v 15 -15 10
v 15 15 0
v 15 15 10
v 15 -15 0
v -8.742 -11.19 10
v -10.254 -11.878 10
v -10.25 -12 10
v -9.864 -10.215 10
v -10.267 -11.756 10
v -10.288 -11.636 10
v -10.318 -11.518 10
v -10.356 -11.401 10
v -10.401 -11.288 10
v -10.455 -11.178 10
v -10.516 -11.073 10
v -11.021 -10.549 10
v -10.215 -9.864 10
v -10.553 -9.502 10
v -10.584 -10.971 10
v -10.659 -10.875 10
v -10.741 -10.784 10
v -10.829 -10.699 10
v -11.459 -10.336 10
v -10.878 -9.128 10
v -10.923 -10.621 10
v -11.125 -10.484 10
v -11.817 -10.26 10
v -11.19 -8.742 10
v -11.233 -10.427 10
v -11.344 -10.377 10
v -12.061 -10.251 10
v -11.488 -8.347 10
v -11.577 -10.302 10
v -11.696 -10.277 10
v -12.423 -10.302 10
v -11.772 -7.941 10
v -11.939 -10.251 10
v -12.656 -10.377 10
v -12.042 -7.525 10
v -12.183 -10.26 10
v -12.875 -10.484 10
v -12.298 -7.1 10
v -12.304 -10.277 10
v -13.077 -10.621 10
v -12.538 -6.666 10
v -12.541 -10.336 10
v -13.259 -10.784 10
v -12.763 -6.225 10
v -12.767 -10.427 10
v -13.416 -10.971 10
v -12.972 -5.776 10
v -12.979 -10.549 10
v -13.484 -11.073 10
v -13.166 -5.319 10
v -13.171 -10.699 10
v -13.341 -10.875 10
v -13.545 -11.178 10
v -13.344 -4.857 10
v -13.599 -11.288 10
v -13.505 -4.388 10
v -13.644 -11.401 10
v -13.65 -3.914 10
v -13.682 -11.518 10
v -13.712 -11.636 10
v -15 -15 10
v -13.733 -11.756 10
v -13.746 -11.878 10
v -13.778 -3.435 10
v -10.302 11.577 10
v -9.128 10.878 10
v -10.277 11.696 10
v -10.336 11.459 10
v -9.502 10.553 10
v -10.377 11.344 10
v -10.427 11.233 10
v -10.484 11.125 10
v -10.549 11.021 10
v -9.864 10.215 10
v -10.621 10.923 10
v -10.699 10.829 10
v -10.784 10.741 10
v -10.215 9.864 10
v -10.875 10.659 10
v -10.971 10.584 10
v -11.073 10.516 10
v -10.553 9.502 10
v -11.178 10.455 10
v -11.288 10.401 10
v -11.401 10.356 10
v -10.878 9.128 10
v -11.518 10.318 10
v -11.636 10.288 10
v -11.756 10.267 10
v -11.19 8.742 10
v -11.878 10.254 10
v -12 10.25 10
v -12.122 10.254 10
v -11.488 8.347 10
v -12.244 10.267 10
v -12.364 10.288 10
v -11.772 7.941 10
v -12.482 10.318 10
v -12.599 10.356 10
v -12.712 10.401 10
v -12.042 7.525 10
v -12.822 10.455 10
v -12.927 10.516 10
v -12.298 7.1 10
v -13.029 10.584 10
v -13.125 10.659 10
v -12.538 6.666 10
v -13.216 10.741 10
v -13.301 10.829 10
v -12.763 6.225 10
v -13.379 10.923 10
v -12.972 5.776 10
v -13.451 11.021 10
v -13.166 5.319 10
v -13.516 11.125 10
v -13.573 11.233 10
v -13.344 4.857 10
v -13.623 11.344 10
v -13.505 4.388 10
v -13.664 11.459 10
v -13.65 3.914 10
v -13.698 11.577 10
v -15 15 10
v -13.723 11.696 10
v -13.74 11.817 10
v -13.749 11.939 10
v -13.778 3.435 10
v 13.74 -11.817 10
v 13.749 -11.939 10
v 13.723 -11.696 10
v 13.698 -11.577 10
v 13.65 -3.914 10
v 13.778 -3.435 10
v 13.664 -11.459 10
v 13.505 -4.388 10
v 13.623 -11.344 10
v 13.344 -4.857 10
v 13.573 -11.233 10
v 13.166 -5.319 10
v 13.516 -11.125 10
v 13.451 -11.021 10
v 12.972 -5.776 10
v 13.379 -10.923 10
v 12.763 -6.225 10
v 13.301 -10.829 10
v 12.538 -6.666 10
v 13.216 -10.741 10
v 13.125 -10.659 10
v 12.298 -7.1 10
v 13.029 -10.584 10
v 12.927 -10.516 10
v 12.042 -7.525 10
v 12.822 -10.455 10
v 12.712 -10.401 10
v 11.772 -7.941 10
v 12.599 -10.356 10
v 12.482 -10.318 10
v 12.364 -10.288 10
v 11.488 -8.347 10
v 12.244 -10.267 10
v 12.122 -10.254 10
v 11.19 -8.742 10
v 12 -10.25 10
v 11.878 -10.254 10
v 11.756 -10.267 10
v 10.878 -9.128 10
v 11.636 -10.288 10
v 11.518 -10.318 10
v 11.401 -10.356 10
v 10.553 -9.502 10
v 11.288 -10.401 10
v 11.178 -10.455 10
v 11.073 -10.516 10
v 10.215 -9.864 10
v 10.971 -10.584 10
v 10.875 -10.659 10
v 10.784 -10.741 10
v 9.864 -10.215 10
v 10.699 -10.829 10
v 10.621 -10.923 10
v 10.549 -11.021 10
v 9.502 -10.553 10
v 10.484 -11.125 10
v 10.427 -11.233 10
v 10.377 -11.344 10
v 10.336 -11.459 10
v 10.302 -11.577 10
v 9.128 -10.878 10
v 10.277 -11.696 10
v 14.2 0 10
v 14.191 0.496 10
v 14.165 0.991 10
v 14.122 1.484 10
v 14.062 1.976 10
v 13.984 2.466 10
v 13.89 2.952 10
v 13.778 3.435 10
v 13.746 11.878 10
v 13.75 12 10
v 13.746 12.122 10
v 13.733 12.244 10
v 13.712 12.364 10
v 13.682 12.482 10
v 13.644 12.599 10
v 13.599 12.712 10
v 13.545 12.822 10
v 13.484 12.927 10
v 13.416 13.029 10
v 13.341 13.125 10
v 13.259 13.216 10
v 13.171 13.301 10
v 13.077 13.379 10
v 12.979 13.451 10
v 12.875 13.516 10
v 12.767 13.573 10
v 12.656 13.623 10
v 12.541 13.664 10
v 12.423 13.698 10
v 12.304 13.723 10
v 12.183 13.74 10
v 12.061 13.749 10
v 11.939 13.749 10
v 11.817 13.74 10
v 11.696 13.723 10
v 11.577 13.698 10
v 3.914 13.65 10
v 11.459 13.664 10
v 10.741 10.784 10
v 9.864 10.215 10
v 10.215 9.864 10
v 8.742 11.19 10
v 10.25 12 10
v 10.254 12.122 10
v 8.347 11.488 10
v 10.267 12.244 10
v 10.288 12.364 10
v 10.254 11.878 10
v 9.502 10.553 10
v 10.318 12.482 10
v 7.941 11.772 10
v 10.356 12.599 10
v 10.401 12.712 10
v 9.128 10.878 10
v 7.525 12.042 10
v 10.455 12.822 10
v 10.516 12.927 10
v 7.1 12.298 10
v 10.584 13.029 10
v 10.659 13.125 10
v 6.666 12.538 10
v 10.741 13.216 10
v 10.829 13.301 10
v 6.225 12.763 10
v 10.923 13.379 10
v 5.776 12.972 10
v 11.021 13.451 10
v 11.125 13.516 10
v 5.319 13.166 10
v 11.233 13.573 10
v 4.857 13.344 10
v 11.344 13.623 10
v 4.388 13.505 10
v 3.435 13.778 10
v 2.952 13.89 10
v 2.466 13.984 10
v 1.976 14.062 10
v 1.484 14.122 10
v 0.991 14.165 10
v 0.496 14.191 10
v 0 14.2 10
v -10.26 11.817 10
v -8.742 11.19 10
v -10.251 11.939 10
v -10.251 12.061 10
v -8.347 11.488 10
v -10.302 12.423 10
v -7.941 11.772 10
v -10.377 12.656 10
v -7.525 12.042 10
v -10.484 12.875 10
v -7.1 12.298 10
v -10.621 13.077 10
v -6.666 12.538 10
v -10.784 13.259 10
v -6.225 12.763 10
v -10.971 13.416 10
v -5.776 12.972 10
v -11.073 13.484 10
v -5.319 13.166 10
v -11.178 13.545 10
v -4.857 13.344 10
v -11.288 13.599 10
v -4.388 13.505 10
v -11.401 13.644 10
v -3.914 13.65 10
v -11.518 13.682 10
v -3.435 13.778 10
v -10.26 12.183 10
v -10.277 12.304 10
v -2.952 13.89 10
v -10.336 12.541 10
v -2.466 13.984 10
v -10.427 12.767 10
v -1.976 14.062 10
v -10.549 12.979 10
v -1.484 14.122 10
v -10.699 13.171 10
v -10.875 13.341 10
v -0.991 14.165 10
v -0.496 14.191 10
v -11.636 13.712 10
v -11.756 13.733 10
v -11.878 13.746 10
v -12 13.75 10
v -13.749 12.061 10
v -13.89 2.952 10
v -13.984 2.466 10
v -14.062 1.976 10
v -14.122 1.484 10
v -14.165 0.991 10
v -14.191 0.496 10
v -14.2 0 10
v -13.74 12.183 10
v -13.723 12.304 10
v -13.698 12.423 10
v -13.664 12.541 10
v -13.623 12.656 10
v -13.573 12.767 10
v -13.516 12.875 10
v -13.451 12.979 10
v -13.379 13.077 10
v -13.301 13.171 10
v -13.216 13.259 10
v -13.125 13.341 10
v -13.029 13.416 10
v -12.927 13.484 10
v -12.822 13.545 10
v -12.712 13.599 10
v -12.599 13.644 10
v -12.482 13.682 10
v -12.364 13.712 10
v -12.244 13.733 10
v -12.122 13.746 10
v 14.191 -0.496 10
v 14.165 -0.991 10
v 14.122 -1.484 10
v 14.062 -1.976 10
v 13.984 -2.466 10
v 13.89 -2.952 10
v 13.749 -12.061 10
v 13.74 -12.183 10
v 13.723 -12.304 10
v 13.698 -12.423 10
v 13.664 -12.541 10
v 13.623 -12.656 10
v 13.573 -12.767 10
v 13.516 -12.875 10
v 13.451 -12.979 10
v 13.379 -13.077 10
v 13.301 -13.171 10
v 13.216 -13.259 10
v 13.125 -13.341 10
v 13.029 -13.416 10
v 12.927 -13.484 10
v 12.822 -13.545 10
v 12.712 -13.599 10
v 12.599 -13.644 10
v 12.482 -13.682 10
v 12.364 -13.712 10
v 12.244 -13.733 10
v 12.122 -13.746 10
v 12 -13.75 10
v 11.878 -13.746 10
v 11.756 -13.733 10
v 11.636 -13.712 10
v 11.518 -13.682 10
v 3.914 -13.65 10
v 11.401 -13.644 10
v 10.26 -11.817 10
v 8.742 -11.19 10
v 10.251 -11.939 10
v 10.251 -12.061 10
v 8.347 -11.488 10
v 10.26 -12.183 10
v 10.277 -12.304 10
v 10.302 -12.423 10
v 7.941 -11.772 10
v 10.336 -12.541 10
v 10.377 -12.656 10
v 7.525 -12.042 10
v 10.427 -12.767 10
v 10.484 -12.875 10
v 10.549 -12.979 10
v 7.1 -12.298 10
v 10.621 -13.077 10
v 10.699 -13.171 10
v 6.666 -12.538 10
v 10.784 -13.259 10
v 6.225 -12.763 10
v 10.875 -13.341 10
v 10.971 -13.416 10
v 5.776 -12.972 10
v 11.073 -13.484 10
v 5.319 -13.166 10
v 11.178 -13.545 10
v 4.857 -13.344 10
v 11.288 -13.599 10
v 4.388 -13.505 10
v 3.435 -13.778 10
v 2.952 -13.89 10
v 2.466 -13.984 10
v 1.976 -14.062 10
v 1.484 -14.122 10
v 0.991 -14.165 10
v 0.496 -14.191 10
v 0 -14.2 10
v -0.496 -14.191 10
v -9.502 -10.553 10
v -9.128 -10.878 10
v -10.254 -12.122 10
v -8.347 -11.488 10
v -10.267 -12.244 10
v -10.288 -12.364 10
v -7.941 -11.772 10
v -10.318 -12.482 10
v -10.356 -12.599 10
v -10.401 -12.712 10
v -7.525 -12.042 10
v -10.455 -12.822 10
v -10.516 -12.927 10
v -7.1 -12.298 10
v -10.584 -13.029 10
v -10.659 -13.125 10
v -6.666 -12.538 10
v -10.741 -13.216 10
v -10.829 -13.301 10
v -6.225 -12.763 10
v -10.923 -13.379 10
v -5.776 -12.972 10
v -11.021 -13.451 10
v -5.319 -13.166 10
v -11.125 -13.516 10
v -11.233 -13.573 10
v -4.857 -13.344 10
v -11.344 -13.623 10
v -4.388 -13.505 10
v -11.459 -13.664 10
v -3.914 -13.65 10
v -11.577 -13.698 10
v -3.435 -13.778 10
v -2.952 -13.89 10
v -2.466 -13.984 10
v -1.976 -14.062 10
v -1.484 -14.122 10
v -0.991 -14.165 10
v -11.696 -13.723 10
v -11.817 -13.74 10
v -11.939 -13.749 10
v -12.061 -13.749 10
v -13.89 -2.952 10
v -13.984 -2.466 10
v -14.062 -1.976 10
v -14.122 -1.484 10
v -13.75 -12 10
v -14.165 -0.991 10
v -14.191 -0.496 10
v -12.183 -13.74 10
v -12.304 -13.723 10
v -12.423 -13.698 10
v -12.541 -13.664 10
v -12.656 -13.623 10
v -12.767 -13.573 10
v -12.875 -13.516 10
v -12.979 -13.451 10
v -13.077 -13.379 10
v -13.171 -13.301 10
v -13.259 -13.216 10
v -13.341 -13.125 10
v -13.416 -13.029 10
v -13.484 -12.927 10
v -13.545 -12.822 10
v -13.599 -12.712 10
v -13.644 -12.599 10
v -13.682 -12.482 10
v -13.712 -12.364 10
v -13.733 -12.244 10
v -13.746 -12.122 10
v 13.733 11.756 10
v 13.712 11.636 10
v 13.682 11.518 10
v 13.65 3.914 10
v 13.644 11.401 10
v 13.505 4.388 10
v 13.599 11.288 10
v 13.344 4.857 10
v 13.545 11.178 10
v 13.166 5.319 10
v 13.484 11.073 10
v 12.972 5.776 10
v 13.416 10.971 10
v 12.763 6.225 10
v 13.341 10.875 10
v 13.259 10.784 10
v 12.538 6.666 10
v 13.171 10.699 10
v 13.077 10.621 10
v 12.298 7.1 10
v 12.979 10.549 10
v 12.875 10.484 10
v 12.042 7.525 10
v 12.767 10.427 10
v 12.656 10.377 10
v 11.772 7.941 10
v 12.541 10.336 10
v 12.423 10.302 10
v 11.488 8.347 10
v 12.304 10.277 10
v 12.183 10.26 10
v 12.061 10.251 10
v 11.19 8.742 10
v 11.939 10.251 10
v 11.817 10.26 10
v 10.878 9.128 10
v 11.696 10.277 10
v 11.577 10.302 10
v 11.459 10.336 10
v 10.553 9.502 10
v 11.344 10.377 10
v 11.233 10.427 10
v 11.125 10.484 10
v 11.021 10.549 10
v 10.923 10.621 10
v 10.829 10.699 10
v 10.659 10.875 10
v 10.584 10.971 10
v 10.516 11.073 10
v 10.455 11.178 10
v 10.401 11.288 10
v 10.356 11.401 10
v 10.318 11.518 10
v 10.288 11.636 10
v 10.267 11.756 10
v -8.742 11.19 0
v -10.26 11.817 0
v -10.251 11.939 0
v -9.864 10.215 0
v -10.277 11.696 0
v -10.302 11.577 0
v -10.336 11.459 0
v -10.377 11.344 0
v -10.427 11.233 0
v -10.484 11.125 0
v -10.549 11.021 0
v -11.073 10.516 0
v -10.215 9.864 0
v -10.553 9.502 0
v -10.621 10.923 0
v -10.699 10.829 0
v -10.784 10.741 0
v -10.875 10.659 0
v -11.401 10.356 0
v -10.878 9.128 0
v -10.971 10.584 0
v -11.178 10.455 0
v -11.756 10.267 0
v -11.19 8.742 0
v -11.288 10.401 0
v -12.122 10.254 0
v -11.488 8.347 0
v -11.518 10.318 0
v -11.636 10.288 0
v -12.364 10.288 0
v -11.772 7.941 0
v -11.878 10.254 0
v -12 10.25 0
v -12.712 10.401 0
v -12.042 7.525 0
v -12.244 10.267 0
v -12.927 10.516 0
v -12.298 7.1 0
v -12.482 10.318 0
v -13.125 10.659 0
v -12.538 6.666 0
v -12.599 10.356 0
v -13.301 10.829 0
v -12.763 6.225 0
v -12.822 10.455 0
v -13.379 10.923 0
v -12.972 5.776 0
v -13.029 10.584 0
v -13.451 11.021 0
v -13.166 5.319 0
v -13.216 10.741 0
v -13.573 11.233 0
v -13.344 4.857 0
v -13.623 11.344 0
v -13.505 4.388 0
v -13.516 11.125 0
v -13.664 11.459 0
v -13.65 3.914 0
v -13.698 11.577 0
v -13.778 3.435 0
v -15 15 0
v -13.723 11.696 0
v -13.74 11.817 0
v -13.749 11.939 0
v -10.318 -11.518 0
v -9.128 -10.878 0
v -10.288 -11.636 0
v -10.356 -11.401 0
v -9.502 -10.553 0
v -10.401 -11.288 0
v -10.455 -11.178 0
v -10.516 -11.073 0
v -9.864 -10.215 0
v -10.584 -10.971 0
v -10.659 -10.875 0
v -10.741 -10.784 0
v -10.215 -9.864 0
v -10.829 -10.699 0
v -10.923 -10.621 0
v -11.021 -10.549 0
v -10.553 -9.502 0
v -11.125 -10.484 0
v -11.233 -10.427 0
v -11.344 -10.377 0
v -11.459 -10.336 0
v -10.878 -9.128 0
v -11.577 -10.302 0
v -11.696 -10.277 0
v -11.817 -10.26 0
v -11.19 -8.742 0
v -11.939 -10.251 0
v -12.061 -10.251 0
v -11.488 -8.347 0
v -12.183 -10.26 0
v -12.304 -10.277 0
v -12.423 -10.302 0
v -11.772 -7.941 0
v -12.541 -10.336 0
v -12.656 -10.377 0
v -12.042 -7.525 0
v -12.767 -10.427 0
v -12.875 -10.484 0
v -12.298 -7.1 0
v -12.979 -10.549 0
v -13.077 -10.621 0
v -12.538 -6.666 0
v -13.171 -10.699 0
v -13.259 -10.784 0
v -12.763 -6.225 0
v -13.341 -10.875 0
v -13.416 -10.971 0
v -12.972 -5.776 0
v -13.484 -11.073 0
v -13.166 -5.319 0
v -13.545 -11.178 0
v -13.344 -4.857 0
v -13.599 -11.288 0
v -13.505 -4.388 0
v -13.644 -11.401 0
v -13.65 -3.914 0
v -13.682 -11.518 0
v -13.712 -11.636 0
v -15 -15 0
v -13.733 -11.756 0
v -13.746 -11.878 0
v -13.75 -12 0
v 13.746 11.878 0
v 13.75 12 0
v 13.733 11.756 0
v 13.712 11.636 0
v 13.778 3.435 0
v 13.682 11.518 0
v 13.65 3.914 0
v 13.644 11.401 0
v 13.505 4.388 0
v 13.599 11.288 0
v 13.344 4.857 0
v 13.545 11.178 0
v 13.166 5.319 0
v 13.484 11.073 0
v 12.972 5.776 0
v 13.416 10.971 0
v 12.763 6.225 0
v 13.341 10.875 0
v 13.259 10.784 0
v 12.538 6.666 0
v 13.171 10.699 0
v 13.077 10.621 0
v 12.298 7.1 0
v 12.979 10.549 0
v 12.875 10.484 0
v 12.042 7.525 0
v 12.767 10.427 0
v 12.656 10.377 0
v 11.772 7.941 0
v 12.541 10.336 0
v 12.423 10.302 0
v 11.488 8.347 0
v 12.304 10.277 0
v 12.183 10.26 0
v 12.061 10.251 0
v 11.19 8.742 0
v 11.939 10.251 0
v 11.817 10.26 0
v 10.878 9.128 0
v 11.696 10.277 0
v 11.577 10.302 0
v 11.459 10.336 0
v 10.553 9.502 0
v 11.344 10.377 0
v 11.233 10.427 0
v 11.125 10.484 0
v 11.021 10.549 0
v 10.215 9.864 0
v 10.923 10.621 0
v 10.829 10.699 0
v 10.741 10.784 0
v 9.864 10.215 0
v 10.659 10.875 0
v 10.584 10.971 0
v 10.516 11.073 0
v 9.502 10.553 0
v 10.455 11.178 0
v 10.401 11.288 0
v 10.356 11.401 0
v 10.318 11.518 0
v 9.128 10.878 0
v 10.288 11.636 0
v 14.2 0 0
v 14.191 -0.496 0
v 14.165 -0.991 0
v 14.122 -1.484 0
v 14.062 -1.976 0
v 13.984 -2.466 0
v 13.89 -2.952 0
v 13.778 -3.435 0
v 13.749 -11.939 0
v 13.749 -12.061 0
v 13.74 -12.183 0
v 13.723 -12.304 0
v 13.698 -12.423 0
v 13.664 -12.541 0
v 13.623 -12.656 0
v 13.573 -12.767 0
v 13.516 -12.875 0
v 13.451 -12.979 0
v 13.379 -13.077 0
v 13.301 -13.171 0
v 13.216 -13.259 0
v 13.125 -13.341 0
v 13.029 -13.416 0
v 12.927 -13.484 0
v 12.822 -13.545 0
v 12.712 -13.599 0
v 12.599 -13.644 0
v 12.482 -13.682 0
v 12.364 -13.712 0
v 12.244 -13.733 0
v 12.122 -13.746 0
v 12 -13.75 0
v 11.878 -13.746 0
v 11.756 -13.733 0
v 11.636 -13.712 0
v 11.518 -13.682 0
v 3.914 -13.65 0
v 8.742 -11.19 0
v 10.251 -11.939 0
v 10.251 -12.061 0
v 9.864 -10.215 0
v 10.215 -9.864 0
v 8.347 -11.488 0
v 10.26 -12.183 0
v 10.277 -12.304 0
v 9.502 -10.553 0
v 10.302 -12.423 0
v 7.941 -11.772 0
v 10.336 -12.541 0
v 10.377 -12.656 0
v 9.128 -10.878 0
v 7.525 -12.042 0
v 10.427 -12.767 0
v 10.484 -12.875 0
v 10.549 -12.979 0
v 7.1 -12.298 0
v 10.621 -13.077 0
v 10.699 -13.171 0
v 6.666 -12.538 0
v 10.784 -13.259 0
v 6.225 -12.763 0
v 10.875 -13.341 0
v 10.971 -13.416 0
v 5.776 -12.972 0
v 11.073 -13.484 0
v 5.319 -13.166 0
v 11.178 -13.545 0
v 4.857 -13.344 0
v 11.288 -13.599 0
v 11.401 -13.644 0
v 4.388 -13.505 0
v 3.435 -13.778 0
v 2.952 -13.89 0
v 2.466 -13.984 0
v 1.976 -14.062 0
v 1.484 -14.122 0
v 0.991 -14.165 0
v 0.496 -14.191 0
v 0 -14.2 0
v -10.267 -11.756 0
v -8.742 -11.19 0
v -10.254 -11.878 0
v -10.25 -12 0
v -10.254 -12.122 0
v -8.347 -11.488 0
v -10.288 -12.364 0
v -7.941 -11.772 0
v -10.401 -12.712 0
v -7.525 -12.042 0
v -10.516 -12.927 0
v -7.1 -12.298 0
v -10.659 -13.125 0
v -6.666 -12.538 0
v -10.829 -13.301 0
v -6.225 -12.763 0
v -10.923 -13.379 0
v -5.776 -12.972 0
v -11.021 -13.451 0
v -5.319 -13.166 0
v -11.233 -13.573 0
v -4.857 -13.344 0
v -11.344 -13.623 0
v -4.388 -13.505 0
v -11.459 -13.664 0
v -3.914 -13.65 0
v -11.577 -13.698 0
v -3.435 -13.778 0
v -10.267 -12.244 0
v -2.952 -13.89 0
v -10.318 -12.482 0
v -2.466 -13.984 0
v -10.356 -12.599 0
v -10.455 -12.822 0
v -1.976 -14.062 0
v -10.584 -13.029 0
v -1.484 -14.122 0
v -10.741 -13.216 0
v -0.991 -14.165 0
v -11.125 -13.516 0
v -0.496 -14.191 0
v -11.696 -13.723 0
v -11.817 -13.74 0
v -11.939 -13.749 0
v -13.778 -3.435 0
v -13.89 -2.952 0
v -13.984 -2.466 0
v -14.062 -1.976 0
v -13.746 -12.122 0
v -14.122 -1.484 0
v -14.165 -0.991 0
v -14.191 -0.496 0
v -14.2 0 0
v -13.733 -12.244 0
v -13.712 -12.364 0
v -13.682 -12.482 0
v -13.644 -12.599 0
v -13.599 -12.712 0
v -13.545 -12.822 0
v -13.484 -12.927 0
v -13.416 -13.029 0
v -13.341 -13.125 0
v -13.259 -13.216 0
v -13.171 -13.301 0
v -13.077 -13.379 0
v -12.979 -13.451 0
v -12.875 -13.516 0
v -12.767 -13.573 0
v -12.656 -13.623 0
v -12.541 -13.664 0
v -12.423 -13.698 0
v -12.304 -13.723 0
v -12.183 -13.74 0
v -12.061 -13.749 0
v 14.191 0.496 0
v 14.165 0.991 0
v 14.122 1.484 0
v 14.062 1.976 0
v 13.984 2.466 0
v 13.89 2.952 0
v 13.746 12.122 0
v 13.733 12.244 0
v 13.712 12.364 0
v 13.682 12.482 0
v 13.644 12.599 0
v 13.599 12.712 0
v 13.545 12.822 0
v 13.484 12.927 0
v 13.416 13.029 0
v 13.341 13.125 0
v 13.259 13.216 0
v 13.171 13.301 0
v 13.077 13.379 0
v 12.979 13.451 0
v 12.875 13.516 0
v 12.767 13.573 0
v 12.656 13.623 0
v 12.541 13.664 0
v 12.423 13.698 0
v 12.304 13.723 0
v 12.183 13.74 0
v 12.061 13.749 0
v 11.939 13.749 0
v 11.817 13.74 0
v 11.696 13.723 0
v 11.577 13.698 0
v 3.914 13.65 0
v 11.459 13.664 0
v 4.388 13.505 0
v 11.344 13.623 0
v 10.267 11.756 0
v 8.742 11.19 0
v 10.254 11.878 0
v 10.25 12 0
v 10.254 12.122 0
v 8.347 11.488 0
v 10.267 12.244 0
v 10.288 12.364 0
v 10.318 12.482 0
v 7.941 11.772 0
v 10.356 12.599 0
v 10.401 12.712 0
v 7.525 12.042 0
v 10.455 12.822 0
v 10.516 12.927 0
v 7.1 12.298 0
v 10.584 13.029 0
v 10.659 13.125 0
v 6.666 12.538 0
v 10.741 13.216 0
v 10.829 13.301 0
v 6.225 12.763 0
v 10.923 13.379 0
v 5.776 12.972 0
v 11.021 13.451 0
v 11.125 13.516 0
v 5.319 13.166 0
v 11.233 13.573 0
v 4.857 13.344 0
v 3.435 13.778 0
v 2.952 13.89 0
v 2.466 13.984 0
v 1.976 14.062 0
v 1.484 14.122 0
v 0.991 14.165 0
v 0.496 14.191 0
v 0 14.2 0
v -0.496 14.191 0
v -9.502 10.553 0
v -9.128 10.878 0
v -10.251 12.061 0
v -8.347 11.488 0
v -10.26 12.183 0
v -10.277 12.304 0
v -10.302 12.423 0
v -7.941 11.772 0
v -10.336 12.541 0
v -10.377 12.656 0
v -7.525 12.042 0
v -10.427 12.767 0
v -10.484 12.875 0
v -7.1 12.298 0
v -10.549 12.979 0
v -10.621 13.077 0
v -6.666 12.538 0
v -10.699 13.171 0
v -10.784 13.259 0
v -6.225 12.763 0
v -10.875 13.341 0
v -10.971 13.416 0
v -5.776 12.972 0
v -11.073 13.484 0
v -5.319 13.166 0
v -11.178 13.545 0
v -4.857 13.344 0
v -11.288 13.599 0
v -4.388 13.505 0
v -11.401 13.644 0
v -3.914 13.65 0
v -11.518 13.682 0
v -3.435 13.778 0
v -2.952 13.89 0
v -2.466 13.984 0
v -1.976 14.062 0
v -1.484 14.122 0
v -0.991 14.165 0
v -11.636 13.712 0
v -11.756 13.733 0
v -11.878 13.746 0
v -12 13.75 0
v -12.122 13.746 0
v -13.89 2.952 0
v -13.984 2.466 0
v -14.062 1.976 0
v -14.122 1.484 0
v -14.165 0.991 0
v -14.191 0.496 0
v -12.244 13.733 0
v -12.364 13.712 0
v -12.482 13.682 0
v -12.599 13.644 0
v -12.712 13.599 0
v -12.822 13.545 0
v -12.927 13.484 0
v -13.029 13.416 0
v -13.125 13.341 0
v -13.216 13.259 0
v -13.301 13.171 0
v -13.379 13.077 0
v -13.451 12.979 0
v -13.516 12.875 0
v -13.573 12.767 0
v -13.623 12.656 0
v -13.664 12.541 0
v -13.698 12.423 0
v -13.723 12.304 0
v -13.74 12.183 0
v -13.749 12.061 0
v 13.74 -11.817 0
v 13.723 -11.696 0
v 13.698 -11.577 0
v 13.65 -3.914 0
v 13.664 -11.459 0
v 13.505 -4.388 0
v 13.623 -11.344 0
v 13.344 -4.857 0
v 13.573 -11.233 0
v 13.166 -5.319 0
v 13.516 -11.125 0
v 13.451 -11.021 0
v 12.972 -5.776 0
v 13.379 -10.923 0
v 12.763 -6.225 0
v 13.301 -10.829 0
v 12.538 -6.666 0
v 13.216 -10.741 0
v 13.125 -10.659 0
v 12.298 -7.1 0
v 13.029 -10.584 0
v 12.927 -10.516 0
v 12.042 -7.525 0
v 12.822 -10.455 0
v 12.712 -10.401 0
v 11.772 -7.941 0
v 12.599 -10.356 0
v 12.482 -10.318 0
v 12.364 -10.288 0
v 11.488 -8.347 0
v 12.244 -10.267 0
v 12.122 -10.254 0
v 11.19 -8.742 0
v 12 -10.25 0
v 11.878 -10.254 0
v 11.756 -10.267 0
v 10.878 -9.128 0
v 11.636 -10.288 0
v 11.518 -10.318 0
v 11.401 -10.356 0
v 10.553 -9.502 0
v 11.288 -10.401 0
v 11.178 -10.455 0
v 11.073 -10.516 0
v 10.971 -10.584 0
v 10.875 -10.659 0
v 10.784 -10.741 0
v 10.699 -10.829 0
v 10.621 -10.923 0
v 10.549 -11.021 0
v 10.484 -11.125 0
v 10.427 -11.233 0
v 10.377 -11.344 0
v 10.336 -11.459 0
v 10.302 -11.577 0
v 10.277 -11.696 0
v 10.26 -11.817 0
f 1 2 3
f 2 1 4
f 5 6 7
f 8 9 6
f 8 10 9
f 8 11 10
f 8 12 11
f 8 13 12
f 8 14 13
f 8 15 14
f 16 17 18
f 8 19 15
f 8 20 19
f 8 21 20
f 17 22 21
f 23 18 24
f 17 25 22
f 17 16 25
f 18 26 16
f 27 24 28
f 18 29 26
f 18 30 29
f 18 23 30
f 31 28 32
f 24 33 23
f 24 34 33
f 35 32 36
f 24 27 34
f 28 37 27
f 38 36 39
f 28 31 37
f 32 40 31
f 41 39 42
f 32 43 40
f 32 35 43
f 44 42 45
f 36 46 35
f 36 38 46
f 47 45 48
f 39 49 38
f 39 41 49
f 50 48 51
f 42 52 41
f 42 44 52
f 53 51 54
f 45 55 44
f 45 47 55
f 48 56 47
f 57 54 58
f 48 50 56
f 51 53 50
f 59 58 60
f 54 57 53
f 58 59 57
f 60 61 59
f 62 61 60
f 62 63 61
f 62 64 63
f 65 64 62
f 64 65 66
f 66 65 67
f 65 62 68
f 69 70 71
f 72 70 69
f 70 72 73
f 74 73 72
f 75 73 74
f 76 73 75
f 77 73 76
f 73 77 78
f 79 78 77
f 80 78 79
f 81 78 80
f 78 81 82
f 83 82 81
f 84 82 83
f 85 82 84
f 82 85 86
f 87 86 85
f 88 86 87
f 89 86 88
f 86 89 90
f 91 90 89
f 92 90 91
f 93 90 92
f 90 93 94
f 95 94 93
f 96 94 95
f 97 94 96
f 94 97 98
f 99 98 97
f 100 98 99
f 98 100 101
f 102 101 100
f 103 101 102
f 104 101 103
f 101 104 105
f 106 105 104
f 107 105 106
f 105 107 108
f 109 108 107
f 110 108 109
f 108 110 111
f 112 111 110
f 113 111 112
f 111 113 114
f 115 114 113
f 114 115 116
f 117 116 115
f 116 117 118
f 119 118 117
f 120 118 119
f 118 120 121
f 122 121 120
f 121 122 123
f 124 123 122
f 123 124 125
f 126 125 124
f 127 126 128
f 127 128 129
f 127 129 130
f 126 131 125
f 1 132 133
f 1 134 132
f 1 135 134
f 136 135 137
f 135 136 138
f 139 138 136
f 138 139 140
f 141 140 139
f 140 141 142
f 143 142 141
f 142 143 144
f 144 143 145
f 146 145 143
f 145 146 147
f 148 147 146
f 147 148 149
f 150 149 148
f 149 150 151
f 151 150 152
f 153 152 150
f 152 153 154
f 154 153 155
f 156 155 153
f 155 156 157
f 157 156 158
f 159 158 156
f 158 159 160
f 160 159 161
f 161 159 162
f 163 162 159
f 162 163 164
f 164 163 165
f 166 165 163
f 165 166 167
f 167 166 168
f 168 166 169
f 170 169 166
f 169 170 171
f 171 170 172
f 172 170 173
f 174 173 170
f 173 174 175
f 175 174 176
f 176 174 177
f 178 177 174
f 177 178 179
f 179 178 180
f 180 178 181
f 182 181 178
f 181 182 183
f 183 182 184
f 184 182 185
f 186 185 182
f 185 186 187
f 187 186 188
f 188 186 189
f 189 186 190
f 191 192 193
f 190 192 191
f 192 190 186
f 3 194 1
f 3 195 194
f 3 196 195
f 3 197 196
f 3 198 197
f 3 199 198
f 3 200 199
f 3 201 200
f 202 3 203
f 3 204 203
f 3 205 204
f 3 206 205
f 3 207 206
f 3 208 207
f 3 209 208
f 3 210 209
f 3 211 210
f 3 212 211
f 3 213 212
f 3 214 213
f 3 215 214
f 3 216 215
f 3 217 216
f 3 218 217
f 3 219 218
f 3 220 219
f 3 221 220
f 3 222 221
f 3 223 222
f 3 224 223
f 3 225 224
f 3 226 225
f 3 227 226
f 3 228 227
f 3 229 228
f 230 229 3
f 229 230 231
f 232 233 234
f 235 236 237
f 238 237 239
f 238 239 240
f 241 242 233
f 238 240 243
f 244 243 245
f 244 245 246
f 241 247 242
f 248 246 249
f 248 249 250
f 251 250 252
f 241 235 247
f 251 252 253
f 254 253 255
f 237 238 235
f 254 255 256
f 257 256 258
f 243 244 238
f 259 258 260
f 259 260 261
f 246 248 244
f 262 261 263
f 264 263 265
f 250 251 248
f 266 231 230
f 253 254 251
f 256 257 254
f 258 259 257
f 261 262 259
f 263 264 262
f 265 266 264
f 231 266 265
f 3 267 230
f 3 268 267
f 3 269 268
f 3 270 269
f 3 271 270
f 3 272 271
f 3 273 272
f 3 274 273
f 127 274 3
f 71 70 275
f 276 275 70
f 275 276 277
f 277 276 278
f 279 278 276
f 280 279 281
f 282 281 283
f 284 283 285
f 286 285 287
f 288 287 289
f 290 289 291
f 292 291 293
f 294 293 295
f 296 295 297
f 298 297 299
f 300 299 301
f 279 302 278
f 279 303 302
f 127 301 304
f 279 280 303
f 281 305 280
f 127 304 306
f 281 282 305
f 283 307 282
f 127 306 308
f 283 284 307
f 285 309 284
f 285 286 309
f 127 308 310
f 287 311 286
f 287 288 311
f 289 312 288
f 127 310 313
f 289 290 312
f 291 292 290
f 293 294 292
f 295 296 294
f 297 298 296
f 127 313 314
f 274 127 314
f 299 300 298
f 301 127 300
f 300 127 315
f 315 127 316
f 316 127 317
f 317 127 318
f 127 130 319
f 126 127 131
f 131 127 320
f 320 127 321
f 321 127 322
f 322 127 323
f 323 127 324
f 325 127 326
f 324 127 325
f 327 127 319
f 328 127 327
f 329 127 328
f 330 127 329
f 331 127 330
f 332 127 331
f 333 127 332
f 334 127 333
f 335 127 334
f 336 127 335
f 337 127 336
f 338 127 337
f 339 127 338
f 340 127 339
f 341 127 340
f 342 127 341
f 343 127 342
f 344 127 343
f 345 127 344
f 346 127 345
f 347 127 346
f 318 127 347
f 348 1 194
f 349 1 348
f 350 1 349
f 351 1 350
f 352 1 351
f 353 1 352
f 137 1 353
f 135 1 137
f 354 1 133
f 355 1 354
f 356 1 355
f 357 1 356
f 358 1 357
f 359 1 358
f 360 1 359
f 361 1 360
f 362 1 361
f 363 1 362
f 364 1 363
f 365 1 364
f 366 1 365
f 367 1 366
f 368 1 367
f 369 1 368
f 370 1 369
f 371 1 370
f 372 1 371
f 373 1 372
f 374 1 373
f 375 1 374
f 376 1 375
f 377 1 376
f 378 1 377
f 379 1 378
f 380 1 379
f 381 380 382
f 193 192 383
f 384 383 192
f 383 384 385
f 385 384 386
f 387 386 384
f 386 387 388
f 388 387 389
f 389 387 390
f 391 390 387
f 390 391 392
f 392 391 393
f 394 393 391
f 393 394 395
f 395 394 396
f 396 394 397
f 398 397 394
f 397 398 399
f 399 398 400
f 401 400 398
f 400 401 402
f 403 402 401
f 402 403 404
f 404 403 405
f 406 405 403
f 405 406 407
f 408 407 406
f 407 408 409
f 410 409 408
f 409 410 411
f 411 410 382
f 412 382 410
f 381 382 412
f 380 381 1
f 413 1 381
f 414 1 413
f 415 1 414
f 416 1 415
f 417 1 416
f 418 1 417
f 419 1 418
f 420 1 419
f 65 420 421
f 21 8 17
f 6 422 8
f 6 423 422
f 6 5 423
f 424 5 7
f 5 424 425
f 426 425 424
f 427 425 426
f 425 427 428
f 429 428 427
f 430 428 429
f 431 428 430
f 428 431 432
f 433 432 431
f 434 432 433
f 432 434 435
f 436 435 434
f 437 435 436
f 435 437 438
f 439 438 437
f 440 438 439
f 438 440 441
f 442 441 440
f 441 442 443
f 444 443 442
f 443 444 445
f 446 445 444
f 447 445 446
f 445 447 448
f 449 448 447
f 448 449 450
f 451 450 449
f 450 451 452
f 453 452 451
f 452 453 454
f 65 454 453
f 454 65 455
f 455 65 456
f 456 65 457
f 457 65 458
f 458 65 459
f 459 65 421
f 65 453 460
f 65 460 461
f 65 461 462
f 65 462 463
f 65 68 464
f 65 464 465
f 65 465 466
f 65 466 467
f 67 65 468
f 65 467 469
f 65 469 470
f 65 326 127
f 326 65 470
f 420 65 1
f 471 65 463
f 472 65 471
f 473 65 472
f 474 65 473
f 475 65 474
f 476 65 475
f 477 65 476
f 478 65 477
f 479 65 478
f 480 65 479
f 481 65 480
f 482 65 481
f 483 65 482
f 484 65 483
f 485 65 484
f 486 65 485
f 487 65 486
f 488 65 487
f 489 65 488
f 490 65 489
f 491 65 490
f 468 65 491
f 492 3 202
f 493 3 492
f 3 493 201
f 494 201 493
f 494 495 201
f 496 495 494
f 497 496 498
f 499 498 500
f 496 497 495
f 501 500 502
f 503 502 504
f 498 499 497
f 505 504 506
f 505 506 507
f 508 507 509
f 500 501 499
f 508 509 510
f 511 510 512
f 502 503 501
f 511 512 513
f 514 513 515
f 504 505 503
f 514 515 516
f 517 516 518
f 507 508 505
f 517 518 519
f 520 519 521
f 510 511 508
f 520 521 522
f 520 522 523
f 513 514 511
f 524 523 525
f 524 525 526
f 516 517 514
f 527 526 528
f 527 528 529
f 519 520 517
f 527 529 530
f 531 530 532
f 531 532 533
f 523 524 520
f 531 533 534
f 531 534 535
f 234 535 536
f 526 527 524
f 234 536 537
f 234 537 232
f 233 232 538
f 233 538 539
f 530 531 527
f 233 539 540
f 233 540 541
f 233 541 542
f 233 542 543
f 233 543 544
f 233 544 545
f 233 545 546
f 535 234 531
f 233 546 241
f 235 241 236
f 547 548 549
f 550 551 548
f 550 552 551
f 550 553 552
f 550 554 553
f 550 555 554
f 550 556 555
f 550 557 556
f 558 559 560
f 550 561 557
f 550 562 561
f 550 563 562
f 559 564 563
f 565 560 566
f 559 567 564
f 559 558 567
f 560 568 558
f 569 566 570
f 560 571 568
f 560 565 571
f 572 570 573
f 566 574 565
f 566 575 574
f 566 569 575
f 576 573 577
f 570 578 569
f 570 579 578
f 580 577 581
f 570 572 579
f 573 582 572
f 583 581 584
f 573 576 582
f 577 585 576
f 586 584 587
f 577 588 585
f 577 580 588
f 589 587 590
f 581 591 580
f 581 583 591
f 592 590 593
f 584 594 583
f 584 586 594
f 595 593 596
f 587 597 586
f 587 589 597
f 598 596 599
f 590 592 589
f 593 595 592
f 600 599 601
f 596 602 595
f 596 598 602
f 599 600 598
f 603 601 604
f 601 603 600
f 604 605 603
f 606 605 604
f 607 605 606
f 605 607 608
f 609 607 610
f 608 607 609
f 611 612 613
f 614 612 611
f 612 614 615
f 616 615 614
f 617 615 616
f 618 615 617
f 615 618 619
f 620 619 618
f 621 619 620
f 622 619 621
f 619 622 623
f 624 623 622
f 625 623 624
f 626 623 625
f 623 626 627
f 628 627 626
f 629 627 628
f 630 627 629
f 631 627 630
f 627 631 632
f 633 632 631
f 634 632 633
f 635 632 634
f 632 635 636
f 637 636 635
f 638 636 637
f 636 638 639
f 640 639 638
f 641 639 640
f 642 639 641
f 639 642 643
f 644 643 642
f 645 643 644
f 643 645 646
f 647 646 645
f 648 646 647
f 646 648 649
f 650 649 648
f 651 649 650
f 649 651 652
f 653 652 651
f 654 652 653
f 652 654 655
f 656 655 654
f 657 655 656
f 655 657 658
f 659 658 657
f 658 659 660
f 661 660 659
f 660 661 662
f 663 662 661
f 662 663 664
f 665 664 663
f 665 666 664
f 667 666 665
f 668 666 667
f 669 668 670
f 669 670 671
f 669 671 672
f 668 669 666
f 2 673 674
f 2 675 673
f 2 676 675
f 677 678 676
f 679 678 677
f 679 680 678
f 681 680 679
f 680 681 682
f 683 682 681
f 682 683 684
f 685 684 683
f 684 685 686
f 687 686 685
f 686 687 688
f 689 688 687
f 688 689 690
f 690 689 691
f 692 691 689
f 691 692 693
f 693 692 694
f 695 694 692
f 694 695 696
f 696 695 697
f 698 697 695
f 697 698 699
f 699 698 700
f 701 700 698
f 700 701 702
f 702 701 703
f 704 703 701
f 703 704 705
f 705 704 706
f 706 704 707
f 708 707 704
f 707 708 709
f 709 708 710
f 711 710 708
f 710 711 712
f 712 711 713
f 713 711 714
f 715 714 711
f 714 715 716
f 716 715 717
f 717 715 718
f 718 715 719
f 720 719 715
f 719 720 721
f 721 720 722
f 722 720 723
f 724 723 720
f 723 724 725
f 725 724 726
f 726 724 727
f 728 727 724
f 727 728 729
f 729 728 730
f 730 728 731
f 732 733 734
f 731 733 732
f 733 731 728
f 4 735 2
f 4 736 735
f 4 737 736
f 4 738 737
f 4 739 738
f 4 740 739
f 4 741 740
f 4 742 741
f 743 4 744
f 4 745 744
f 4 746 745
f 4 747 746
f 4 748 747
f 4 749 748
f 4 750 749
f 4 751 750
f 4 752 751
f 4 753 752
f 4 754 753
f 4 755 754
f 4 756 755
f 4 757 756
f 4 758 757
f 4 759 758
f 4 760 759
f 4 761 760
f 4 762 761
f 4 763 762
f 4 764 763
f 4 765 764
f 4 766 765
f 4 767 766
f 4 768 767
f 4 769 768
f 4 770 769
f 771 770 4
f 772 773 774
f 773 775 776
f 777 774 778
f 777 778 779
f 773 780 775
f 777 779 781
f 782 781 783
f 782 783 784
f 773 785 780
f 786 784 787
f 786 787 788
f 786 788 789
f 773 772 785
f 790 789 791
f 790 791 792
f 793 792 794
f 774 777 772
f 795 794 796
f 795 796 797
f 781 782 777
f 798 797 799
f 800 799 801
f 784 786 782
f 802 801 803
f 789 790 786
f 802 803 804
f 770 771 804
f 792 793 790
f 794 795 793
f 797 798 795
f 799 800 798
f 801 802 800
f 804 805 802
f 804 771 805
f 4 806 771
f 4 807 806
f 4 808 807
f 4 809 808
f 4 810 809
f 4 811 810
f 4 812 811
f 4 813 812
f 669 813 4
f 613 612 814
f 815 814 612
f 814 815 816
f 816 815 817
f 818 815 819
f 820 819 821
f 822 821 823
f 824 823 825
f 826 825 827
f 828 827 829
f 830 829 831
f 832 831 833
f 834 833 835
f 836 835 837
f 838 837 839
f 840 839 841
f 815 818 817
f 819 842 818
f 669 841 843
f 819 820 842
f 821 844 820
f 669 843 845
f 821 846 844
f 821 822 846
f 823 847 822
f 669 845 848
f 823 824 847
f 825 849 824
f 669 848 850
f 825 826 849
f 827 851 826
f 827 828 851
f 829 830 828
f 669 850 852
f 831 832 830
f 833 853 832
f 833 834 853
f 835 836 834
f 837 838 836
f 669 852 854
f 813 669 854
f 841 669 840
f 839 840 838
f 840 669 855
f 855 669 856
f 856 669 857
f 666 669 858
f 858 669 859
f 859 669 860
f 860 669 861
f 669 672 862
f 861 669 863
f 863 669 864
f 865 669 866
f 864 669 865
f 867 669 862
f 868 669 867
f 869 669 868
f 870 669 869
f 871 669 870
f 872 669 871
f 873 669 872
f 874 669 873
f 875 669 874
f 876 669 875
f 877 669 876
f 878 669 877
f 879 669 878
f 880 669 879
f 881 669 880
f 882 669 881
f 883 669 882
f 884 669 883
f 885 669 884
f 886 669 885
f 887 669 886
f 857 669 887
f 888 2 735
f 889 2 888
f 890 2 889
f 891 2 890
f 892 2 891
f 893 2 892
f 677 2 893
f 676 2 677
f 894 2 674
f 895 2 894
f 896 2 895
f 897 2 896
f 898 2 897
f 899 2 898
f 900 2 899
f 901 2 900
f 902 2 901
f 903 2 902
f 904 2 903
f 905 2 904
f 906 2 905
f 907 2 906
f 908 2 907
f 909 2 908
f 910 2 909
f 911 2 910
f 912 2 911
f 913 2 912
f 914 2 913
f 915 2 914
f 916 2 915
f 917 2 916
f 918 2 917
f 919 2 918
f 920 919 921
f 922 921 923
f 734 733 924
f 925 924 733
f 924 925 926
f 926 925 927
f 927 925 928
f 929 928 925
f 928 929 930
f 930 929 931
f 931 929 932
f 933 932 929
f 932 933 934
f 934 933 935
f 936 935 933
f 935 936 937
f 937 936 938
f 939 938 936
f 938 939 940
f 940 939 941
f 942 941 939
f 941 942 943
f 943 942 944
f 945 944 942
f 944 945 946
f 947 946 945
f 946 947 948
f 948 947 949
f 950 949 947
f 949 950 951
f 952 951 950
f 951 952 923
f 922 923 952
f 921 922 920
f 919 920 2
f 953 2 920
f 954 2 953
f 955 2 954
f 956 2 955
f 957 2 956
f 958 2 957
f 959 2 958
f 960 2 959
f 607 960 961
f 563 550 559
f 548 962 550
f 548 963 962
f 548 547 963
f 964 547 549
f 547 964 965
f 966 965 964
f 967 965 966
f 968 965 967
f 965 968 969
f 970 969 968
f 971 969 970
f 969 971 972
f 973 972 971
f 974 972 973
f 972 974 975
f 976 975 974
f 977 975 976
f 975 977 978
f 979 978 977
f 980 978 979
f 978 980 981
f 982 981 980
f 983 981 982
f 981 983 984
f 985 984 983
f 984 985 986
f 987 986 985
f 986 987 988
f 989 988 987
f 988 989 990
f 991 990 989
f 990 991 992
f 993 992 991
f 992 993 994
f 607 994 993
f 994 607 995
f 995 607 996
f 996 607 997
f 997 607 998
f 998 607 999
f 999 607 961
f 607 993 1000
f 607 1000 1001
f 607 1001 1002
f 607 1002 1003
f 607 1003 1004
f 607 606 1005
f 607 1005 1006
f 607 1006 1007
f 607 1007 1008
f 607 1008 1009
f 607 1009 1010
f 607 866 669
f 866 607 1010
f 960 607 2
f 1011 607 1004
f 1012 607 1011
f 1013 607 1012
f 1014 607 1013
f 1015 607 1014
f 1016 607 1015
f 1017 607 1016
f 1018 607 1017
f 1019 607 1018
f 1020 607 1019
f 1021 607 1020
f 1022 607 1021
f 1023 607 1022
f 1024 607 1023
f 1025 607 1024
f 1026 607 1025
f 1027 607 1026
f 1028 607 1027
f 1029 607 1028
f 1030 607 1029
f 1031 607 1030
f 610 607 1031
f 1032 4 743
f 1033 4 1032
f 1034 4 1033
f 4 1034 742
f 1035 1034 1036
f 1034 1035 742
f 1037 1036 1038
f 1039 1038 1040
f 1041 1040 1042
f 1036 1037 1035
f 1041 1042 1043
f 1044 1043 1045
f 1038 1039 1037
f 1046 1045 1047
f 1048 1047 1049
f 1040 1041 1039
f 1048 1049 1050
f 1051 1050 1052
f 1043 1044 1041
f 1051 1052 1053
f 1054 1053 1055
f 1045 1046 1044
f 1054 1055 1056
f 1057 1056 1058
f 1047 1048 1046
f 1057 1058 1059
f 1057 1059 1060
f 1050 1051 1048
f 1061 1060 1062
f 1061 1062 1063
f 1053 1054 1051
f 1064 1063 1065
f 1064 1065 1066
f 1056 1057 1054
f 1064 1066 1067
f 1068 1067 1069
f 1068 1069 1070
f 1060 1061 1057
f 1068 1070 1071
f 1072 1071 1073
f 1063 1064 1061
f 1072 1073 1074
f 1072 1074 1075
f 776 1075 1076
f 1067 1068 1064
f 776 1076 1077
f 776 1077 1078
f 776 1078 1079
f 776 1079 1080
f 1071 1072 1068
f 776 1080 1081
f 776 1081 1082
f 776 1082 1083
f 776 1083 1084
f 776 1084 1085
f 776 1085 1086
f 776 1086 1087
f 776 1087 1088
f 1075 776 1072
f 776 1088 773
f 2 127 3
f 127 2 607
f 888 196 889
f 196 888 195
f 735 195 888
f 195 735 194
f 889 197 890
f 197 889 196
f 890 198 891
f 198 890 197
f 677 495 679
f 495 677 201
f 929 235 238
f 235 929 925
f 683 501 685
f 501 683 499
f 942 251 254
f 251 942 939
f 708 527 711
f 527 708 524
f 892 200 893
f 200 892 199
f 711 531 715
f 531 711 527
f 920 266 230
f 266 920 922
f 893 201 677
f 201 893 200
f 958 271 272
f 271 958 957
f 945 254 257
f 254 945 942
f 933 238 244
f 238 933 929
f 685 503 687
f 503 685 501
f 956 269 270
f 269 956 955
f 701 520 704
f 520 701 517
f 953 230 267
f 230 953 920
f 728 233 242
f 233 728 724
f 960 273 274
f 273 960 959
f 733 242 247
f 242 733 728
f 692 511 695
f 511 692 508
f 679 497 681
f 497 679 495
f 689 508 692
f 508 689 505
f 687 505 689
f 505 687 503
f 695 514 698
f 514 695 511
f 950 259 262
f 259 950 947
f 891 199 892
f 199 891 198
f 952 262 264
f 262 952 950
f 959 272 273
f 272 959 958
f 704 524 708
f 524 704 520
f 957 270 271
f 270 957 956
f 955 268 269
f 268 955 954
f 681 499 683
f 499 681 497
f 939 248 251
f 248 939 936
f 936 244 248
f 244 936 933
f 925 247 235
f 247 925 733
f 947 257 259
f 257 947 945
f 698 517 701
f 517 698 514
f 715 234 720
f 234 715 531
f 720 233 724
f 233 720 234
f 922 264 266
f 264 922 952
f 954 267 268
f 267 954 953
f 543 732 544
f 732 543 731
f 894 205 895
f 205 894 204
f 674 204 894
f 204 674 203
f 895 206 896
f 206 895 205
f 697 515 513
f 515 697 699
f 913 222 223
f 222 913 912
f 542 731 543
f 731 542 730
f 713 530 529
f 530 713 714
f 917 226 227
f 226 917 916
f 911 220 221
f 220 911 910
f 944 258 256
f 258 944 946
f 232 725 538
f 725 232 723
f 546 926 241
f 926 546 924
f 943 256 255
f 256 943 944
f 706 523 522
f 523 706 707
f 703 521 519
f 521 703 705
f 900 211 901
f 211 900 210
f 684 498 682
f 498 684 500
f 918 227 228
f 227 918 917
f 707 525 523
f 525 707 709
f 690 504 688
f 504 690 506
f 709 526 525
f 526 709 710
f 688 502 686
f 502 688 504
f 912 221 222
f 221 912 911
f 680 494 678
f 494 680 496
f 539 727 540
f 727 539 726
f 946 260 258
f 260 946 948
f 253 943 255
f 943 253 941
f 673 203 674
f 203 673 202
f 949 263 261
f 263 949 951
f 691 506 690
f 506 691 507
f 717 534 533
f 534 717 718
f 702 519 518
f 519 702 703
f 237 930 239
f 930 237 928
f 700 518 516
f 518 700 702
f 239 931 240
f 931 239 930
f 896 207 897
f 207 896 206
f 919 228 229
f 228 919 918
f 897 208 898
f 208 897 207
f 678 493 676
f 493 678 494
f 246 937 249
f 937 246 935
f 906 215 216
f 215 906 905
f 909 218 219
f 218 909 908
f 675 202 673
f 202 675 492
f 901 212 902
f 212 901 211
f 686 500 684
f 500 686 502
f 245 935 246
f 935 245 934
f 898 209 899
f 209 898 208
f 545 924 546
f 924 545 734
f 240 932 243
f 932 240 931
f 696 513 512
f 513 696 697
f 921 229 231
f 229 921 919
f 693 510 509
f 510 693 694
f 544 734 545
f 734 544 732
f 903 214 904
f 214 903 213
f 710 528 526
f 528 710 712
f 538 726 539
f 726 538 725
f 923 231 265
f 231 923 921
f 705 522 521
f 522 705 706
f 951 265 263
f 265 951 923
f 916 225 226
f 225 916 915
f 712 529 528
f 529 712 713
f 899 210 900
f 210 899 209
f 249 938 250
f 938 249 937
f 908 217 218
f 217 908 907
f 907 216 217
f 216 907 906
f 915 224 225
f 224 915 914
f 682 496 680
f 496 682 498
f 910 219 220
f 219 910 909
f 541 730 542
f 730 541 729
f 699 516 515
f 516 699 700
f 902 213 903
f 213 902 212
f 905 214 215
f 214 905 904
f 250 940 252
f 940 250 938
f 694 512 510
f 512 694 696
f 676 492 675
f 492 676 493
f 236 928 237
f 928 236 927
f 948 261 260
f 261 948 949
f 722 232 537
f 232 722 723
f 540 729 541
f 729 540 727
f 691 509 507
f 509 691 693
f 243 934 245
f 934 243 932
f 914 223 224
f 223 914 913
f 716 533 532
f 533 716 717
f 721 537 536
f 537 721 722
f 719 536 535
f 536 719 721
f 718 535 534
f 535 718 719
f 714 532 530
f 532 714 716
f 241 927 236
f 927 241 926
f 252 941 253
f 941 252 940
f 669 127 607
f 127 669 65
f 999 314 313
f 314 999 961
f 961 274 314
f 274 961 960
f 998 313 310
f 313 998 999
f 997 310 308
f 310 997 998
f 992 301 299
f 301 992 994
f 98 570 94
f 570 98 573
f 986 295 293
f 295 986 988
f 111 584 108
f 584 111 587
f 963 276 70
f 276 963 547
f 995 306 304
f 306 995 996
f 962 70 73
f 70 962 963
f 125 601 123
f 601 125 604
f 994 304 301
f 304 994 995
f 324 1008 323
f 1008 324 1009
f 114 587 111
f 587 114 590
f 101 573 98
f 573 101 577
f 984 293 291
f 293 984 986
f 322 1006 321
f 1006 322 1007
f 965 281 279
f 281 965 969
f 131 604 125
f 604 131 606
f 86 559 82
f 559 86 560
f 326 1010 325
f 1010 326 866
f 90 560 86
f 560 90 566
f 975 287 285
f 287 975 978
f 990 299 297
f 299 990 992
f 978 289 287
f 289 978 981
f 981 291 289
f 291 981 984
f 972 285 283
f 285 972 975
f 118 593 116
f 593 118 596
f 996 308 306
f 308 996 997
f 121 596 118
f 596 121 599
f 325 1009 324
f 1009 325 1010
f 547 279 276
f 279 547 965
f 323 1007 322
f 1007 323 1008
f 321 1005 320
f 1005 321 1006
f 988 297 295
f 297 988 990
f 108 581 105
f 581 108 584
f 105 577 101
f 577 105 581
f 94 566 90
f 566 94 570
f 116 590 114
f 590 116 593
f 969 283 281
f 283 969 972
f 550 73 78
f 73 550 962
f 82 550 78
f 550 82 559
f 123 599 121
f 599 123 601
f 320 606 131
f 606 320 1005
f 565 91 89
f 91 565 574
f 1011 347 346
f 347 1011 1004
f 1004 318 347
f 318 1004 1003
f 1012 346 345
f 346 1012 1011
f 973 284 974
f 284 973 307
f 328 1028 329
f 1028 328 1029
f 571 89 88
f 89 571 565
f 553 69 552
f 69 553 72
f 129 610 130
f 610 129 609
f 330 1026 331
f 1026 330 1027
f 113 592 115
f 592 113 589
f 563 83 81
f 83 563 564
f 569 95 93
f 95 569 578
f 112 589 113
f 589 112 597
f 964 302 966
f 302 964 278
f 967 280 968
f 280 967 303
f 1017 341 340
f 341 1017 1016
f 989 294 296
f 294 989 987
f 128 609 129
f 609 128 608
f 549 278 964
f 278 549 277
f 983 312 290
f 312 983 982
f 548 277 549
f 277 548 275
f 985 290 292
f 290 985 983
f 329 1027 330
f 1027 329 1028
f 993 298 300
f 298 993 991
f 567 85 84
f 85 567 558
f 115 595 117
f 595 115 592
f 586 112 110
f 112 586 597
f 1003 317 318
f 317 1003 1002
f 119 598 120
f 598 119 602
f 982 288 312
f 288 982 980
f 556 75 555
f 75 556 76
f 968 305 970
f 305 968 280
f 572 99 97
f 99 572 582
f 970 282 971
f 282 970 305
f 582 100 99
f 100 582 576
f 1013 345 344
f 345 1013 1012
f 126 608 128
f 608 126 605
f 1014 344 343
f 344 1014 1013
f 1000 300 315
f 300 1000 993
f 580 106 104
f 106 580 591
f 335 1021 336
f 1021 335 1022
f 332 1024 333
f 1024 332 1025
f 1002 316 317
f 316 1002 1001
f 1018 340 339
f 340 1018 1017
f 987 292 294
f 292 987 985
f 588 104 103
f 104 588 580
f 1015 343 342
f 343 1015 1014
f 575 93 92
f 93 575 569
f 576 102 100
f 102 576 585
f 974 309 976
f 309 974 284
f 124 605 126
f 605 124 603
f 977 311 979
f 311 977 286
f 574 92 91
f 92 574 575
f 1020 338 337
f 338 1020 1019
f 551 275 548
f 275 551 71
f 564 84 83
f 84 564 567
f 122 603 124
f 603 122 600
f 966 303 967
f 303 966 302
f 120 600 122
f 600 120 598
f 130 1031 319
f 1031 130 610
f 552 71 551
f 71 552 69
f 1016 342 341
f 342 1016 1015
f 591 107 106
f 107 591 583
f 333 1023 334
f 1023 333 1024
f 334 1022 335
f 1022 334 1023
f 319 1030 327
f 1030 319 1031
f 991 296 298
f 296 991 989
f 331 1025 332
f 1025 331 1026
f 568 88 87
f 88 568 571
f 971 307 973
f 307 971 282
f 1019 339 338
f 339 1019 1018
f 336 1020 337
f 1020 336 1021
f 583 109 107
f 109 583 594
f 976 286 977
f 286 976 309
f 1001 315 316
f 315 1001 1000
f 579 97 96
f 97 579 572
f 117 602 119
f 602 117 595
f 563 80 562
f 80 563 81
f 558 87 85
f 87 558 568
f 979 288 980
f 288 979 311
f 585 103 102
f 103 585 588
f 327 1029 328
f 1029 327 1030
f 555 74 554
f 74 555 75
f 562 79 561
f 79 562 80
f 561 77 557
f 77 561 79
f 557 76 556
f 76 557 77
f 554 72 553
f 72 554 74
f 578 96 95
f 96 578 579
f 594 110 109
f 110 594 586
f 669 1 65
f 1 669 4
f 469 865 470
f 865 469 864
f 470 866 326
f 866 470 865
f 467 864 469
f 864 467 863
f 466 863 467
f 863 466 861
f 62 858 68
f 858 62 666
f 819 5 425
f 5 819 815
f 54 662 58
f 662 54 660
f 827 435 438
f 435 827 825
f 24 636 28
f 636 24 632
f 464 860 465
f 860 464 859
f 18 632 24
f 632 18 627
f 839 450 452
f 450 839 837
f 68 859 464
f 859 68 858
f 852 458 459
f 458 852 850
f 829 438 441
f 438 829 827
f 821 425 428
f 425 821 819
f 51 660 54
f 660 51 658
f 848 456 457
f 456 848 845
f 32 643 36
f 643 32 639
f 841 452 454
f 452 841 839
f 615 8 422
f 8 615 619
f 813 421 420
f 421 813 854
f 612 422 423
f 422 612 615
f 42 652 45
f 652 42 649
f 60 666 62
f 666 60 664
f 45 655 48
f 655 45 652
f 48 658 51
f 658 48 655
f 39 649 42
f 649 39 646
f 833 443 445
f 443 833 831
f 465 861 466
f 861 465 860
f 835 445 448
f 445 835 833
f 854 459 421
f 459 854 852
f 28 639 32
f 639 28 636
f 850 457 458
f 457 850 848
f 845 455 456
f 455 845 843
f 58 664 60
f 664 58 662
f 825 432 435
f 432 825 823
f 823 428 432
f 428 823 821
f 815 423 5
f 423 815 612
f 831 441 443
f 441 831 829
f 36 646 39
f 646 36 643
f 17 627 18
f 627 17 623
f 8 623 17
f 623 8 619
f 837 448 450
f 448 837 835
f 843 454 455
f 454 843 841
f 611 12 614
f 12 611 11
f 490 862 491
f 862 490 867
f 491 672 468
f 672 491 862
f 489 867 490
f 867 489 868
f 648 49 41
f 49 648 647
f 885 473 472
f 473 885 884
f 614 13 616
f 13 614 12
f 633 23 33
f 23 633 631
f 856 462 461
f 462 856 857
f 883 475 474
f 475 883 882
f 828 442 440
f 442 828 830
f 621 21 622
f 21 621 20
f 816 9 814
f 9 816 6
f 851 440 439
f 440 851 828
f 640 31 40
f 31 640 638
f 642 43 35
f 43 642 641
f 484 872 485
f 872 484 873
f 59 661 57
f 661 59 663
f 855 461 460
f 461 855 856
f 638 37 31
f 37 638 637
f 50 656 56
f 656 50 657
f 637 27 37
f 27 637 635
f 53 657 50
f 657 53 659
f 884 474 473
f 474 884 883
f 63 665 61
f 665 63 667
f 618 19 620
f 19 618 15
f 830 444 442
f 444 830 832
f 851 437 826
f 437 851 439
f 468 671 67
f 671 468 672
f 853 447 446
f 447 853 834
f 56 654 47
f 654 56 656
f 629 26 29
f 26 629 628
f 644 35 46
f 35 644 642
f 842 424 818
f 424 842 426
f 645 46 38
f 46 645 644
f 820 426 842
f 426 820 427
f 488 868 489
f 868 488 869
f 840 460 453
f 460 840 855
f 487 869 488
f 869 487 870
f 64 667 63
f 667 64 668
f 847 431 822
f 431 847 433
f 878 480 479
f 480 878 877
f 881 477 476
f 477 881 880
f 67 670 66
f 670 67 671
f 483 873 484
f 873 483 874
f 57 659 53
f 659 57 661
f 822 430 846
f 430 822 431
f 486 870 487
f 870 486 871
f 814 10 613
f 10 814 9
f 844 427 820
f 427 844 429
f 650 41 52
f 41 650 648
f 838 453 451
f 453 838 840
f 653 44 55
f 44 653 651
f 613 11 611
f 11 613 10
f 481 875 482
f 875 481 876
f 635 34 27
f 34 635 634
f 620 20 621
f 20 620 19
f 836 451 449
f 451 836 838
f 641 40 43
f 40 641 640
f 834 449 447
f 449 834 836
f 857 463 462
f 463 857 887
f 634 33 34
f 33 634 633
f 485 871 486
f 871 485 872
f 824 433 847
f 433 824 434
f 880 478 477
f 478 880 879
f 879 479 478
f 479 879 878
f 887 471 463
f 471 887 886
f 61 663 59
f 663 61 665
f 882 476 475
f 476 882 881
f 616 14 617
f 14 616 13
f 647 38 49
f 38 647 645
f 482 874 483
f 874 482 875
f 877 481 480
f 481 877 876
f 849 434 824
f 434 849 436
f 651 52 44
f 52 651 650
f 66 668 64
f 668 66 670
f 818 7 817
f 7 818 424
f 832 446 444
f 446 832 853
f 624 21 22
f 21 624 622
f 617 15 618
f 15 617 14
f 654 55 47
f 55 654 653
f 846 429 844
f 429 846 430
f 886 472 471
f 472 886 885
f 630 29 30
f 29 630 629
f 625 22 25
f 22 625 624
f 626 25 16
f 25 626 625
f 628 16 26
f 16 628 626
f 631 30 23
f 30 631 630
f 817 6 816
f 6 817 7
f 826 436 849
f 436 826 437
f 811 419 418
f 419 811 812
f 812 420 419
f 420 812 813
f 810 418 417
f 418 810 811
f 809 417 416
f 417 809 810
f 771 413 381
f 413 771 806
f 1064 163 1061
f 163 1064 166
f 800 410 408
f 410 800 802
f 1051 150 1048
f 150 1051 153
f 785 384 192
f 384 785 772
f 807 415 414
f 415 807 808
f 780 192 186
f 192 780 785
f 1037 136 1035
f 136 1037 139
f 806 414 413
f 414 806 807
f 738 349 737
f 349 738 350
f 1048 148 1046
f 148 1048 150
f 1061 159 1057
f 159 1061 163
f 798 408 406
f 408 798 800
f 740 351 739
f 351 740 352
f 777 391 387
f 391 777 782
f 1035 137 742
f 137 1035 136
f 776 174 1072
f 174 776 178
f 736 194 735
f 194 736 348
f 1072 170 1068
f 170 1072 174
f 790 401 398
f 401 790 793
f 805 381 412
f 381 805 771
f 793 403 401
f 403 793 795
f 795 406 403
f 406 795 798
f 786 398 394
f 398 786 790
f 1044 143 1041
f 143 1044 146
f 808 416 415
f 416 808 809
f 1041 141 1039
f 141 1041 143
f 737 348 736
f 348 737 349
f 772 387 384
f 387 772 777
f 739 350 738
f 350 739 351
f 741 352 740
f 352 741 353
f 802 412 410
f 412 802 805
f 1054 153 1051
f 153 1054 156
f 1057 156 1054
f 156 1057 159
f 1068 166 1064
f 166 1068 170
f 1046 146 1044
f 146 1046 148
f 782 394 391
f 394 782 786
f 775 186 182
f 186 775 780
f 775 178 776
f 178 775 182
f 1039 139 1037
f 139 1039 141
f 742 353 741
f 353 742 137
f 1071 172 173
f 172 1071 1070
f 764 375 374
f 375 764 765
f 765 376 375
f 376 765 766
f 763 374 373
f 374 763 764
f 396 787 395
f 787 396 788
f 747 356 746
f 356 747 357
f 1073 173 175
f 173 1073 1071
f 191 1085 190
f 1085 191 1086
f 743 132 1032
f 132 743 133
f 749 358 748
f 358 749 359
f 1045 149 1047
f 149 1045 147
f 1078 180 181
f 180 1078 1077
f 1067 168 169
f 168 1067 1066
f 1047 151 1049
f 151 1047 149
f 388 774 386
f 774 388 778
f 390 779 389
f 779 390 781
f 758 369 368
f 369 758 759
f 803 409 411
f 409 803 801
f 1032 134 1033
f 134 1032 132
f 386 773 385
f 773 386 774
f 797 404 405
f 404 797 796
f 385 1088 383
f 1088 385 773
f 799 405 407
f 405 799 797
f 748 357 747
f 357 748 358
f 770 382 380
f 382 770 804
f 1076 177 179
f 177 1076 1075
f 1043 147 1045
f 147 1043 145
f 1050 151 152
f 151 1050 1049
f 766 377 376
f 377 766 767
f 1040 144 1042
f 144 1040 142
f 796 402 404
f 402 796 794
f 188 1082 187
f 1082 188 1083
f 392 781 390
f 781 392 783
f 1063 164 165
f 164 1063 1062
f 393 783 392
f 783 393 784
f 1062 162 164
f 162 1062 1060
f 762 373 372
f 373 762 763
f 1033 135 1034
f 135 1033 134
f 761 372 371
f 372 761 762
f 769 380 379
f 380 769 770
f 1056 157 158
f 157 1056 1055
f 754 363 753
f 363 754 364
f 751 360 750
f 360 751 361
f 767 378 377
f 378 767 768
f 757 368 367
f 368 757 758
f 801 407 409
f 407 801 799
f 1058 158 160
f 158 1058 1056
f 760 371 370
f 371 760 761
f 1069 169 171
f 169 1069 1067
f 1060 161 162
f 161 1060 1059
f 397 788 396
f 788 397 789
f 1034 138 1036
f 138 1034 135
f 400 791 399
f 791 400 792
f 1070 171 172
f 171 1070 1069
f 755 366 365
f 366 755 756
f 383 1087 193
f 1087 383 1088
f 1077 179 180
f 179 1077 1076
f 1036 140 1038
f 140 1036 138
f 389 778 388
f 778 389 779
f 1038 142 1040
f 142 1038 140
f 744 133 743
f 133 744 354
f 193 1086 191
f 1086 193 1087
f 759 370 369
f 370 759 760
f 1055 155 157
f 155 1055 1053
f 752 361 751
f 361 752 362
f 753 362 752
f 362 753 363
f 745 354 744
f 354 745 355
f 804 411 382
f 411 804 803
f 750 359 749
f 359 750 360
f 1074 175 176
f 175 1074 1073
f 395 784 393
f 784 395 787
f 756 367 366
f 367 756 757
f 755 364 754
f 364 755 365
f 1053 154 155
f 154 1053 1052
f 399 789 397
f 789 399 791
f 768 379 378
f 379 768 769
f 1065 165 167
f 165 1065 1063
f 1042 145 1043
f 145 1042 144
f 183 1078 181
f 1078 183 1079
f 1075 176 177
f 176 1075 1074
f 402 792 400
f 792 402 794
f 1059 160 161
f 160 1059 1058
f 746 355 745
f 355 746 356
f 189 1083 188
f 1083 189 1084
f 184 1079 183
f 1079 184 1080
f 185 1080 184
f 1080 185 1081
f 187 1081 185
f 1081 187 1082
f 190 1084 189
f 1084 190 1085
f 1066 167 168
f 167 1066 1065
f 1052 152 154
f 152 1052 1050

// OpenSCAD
module fan_30mm_quarter(){
    difference(){
        translate([7.5, 7.5, 5]){
            cube([15, 15, 10], center=true);
        }
        cylinder(r = 14.2, h = 100, $fn=180, center=true);
        translate([12,12]){
            difference(){
                translate([1.5, 1.5, 0]){
                    cube([3.05, 3.05, 50], center = true);
                }
                cylinder(r = 3, h = 50, $fn=180, center=true);
            }
        }
        translate([12, 12]){
            cylinder(r = 1.75, h = 50, center = true, $fn = 90);
        }
    }
}

module fan_30mm_quarter_square(){
    difference(){
        translate([7.5, 7.5, 5]){
            cube([15, 15, 10], center=true);
        }
        cylinder(r = 14.2, h = 100, $fn=180, center=true);
        translate([12, 12]){
            cylinder(r = 1.75, h = 50, center = true, $fn = 90);
        }
    }
  }

module fan_no_center(){
                for(n = [0:3]){
                rotate([0, 0, 90 * n]){
                   fan_30mm_quarter();  
                }
            }
    }
    //fan_no_center();
    
  module fan_no_center_square(){
              for(n = [0:3]){
              rotate([0, 0, 90 * n]){
                 fan_30mm_quarter_square();  
              }
          }
  }
  fan_no_center_square();

module f(){
    intersection(){
        cube([30,30,100], center=true);
        union(){
            color("blue", 0.5)cylinder(r=17 / 2, h=10, $fn=90);
            for(n = [0:2]){
                color("red")rotate([0,0,10 + 120 * n])translate([0,5,0])cube([20, 2, 1]);
            }
            fan_no_center();
        }
    }
}


module fan_30mm(){f();}

module fan_30mm_2d(){
    difference(){
        fan_30mm();
        translate([0,0,5 + 2]){
            cube([100,100,10], center=true);
        }
    }
}
    
//fan_30mm();
